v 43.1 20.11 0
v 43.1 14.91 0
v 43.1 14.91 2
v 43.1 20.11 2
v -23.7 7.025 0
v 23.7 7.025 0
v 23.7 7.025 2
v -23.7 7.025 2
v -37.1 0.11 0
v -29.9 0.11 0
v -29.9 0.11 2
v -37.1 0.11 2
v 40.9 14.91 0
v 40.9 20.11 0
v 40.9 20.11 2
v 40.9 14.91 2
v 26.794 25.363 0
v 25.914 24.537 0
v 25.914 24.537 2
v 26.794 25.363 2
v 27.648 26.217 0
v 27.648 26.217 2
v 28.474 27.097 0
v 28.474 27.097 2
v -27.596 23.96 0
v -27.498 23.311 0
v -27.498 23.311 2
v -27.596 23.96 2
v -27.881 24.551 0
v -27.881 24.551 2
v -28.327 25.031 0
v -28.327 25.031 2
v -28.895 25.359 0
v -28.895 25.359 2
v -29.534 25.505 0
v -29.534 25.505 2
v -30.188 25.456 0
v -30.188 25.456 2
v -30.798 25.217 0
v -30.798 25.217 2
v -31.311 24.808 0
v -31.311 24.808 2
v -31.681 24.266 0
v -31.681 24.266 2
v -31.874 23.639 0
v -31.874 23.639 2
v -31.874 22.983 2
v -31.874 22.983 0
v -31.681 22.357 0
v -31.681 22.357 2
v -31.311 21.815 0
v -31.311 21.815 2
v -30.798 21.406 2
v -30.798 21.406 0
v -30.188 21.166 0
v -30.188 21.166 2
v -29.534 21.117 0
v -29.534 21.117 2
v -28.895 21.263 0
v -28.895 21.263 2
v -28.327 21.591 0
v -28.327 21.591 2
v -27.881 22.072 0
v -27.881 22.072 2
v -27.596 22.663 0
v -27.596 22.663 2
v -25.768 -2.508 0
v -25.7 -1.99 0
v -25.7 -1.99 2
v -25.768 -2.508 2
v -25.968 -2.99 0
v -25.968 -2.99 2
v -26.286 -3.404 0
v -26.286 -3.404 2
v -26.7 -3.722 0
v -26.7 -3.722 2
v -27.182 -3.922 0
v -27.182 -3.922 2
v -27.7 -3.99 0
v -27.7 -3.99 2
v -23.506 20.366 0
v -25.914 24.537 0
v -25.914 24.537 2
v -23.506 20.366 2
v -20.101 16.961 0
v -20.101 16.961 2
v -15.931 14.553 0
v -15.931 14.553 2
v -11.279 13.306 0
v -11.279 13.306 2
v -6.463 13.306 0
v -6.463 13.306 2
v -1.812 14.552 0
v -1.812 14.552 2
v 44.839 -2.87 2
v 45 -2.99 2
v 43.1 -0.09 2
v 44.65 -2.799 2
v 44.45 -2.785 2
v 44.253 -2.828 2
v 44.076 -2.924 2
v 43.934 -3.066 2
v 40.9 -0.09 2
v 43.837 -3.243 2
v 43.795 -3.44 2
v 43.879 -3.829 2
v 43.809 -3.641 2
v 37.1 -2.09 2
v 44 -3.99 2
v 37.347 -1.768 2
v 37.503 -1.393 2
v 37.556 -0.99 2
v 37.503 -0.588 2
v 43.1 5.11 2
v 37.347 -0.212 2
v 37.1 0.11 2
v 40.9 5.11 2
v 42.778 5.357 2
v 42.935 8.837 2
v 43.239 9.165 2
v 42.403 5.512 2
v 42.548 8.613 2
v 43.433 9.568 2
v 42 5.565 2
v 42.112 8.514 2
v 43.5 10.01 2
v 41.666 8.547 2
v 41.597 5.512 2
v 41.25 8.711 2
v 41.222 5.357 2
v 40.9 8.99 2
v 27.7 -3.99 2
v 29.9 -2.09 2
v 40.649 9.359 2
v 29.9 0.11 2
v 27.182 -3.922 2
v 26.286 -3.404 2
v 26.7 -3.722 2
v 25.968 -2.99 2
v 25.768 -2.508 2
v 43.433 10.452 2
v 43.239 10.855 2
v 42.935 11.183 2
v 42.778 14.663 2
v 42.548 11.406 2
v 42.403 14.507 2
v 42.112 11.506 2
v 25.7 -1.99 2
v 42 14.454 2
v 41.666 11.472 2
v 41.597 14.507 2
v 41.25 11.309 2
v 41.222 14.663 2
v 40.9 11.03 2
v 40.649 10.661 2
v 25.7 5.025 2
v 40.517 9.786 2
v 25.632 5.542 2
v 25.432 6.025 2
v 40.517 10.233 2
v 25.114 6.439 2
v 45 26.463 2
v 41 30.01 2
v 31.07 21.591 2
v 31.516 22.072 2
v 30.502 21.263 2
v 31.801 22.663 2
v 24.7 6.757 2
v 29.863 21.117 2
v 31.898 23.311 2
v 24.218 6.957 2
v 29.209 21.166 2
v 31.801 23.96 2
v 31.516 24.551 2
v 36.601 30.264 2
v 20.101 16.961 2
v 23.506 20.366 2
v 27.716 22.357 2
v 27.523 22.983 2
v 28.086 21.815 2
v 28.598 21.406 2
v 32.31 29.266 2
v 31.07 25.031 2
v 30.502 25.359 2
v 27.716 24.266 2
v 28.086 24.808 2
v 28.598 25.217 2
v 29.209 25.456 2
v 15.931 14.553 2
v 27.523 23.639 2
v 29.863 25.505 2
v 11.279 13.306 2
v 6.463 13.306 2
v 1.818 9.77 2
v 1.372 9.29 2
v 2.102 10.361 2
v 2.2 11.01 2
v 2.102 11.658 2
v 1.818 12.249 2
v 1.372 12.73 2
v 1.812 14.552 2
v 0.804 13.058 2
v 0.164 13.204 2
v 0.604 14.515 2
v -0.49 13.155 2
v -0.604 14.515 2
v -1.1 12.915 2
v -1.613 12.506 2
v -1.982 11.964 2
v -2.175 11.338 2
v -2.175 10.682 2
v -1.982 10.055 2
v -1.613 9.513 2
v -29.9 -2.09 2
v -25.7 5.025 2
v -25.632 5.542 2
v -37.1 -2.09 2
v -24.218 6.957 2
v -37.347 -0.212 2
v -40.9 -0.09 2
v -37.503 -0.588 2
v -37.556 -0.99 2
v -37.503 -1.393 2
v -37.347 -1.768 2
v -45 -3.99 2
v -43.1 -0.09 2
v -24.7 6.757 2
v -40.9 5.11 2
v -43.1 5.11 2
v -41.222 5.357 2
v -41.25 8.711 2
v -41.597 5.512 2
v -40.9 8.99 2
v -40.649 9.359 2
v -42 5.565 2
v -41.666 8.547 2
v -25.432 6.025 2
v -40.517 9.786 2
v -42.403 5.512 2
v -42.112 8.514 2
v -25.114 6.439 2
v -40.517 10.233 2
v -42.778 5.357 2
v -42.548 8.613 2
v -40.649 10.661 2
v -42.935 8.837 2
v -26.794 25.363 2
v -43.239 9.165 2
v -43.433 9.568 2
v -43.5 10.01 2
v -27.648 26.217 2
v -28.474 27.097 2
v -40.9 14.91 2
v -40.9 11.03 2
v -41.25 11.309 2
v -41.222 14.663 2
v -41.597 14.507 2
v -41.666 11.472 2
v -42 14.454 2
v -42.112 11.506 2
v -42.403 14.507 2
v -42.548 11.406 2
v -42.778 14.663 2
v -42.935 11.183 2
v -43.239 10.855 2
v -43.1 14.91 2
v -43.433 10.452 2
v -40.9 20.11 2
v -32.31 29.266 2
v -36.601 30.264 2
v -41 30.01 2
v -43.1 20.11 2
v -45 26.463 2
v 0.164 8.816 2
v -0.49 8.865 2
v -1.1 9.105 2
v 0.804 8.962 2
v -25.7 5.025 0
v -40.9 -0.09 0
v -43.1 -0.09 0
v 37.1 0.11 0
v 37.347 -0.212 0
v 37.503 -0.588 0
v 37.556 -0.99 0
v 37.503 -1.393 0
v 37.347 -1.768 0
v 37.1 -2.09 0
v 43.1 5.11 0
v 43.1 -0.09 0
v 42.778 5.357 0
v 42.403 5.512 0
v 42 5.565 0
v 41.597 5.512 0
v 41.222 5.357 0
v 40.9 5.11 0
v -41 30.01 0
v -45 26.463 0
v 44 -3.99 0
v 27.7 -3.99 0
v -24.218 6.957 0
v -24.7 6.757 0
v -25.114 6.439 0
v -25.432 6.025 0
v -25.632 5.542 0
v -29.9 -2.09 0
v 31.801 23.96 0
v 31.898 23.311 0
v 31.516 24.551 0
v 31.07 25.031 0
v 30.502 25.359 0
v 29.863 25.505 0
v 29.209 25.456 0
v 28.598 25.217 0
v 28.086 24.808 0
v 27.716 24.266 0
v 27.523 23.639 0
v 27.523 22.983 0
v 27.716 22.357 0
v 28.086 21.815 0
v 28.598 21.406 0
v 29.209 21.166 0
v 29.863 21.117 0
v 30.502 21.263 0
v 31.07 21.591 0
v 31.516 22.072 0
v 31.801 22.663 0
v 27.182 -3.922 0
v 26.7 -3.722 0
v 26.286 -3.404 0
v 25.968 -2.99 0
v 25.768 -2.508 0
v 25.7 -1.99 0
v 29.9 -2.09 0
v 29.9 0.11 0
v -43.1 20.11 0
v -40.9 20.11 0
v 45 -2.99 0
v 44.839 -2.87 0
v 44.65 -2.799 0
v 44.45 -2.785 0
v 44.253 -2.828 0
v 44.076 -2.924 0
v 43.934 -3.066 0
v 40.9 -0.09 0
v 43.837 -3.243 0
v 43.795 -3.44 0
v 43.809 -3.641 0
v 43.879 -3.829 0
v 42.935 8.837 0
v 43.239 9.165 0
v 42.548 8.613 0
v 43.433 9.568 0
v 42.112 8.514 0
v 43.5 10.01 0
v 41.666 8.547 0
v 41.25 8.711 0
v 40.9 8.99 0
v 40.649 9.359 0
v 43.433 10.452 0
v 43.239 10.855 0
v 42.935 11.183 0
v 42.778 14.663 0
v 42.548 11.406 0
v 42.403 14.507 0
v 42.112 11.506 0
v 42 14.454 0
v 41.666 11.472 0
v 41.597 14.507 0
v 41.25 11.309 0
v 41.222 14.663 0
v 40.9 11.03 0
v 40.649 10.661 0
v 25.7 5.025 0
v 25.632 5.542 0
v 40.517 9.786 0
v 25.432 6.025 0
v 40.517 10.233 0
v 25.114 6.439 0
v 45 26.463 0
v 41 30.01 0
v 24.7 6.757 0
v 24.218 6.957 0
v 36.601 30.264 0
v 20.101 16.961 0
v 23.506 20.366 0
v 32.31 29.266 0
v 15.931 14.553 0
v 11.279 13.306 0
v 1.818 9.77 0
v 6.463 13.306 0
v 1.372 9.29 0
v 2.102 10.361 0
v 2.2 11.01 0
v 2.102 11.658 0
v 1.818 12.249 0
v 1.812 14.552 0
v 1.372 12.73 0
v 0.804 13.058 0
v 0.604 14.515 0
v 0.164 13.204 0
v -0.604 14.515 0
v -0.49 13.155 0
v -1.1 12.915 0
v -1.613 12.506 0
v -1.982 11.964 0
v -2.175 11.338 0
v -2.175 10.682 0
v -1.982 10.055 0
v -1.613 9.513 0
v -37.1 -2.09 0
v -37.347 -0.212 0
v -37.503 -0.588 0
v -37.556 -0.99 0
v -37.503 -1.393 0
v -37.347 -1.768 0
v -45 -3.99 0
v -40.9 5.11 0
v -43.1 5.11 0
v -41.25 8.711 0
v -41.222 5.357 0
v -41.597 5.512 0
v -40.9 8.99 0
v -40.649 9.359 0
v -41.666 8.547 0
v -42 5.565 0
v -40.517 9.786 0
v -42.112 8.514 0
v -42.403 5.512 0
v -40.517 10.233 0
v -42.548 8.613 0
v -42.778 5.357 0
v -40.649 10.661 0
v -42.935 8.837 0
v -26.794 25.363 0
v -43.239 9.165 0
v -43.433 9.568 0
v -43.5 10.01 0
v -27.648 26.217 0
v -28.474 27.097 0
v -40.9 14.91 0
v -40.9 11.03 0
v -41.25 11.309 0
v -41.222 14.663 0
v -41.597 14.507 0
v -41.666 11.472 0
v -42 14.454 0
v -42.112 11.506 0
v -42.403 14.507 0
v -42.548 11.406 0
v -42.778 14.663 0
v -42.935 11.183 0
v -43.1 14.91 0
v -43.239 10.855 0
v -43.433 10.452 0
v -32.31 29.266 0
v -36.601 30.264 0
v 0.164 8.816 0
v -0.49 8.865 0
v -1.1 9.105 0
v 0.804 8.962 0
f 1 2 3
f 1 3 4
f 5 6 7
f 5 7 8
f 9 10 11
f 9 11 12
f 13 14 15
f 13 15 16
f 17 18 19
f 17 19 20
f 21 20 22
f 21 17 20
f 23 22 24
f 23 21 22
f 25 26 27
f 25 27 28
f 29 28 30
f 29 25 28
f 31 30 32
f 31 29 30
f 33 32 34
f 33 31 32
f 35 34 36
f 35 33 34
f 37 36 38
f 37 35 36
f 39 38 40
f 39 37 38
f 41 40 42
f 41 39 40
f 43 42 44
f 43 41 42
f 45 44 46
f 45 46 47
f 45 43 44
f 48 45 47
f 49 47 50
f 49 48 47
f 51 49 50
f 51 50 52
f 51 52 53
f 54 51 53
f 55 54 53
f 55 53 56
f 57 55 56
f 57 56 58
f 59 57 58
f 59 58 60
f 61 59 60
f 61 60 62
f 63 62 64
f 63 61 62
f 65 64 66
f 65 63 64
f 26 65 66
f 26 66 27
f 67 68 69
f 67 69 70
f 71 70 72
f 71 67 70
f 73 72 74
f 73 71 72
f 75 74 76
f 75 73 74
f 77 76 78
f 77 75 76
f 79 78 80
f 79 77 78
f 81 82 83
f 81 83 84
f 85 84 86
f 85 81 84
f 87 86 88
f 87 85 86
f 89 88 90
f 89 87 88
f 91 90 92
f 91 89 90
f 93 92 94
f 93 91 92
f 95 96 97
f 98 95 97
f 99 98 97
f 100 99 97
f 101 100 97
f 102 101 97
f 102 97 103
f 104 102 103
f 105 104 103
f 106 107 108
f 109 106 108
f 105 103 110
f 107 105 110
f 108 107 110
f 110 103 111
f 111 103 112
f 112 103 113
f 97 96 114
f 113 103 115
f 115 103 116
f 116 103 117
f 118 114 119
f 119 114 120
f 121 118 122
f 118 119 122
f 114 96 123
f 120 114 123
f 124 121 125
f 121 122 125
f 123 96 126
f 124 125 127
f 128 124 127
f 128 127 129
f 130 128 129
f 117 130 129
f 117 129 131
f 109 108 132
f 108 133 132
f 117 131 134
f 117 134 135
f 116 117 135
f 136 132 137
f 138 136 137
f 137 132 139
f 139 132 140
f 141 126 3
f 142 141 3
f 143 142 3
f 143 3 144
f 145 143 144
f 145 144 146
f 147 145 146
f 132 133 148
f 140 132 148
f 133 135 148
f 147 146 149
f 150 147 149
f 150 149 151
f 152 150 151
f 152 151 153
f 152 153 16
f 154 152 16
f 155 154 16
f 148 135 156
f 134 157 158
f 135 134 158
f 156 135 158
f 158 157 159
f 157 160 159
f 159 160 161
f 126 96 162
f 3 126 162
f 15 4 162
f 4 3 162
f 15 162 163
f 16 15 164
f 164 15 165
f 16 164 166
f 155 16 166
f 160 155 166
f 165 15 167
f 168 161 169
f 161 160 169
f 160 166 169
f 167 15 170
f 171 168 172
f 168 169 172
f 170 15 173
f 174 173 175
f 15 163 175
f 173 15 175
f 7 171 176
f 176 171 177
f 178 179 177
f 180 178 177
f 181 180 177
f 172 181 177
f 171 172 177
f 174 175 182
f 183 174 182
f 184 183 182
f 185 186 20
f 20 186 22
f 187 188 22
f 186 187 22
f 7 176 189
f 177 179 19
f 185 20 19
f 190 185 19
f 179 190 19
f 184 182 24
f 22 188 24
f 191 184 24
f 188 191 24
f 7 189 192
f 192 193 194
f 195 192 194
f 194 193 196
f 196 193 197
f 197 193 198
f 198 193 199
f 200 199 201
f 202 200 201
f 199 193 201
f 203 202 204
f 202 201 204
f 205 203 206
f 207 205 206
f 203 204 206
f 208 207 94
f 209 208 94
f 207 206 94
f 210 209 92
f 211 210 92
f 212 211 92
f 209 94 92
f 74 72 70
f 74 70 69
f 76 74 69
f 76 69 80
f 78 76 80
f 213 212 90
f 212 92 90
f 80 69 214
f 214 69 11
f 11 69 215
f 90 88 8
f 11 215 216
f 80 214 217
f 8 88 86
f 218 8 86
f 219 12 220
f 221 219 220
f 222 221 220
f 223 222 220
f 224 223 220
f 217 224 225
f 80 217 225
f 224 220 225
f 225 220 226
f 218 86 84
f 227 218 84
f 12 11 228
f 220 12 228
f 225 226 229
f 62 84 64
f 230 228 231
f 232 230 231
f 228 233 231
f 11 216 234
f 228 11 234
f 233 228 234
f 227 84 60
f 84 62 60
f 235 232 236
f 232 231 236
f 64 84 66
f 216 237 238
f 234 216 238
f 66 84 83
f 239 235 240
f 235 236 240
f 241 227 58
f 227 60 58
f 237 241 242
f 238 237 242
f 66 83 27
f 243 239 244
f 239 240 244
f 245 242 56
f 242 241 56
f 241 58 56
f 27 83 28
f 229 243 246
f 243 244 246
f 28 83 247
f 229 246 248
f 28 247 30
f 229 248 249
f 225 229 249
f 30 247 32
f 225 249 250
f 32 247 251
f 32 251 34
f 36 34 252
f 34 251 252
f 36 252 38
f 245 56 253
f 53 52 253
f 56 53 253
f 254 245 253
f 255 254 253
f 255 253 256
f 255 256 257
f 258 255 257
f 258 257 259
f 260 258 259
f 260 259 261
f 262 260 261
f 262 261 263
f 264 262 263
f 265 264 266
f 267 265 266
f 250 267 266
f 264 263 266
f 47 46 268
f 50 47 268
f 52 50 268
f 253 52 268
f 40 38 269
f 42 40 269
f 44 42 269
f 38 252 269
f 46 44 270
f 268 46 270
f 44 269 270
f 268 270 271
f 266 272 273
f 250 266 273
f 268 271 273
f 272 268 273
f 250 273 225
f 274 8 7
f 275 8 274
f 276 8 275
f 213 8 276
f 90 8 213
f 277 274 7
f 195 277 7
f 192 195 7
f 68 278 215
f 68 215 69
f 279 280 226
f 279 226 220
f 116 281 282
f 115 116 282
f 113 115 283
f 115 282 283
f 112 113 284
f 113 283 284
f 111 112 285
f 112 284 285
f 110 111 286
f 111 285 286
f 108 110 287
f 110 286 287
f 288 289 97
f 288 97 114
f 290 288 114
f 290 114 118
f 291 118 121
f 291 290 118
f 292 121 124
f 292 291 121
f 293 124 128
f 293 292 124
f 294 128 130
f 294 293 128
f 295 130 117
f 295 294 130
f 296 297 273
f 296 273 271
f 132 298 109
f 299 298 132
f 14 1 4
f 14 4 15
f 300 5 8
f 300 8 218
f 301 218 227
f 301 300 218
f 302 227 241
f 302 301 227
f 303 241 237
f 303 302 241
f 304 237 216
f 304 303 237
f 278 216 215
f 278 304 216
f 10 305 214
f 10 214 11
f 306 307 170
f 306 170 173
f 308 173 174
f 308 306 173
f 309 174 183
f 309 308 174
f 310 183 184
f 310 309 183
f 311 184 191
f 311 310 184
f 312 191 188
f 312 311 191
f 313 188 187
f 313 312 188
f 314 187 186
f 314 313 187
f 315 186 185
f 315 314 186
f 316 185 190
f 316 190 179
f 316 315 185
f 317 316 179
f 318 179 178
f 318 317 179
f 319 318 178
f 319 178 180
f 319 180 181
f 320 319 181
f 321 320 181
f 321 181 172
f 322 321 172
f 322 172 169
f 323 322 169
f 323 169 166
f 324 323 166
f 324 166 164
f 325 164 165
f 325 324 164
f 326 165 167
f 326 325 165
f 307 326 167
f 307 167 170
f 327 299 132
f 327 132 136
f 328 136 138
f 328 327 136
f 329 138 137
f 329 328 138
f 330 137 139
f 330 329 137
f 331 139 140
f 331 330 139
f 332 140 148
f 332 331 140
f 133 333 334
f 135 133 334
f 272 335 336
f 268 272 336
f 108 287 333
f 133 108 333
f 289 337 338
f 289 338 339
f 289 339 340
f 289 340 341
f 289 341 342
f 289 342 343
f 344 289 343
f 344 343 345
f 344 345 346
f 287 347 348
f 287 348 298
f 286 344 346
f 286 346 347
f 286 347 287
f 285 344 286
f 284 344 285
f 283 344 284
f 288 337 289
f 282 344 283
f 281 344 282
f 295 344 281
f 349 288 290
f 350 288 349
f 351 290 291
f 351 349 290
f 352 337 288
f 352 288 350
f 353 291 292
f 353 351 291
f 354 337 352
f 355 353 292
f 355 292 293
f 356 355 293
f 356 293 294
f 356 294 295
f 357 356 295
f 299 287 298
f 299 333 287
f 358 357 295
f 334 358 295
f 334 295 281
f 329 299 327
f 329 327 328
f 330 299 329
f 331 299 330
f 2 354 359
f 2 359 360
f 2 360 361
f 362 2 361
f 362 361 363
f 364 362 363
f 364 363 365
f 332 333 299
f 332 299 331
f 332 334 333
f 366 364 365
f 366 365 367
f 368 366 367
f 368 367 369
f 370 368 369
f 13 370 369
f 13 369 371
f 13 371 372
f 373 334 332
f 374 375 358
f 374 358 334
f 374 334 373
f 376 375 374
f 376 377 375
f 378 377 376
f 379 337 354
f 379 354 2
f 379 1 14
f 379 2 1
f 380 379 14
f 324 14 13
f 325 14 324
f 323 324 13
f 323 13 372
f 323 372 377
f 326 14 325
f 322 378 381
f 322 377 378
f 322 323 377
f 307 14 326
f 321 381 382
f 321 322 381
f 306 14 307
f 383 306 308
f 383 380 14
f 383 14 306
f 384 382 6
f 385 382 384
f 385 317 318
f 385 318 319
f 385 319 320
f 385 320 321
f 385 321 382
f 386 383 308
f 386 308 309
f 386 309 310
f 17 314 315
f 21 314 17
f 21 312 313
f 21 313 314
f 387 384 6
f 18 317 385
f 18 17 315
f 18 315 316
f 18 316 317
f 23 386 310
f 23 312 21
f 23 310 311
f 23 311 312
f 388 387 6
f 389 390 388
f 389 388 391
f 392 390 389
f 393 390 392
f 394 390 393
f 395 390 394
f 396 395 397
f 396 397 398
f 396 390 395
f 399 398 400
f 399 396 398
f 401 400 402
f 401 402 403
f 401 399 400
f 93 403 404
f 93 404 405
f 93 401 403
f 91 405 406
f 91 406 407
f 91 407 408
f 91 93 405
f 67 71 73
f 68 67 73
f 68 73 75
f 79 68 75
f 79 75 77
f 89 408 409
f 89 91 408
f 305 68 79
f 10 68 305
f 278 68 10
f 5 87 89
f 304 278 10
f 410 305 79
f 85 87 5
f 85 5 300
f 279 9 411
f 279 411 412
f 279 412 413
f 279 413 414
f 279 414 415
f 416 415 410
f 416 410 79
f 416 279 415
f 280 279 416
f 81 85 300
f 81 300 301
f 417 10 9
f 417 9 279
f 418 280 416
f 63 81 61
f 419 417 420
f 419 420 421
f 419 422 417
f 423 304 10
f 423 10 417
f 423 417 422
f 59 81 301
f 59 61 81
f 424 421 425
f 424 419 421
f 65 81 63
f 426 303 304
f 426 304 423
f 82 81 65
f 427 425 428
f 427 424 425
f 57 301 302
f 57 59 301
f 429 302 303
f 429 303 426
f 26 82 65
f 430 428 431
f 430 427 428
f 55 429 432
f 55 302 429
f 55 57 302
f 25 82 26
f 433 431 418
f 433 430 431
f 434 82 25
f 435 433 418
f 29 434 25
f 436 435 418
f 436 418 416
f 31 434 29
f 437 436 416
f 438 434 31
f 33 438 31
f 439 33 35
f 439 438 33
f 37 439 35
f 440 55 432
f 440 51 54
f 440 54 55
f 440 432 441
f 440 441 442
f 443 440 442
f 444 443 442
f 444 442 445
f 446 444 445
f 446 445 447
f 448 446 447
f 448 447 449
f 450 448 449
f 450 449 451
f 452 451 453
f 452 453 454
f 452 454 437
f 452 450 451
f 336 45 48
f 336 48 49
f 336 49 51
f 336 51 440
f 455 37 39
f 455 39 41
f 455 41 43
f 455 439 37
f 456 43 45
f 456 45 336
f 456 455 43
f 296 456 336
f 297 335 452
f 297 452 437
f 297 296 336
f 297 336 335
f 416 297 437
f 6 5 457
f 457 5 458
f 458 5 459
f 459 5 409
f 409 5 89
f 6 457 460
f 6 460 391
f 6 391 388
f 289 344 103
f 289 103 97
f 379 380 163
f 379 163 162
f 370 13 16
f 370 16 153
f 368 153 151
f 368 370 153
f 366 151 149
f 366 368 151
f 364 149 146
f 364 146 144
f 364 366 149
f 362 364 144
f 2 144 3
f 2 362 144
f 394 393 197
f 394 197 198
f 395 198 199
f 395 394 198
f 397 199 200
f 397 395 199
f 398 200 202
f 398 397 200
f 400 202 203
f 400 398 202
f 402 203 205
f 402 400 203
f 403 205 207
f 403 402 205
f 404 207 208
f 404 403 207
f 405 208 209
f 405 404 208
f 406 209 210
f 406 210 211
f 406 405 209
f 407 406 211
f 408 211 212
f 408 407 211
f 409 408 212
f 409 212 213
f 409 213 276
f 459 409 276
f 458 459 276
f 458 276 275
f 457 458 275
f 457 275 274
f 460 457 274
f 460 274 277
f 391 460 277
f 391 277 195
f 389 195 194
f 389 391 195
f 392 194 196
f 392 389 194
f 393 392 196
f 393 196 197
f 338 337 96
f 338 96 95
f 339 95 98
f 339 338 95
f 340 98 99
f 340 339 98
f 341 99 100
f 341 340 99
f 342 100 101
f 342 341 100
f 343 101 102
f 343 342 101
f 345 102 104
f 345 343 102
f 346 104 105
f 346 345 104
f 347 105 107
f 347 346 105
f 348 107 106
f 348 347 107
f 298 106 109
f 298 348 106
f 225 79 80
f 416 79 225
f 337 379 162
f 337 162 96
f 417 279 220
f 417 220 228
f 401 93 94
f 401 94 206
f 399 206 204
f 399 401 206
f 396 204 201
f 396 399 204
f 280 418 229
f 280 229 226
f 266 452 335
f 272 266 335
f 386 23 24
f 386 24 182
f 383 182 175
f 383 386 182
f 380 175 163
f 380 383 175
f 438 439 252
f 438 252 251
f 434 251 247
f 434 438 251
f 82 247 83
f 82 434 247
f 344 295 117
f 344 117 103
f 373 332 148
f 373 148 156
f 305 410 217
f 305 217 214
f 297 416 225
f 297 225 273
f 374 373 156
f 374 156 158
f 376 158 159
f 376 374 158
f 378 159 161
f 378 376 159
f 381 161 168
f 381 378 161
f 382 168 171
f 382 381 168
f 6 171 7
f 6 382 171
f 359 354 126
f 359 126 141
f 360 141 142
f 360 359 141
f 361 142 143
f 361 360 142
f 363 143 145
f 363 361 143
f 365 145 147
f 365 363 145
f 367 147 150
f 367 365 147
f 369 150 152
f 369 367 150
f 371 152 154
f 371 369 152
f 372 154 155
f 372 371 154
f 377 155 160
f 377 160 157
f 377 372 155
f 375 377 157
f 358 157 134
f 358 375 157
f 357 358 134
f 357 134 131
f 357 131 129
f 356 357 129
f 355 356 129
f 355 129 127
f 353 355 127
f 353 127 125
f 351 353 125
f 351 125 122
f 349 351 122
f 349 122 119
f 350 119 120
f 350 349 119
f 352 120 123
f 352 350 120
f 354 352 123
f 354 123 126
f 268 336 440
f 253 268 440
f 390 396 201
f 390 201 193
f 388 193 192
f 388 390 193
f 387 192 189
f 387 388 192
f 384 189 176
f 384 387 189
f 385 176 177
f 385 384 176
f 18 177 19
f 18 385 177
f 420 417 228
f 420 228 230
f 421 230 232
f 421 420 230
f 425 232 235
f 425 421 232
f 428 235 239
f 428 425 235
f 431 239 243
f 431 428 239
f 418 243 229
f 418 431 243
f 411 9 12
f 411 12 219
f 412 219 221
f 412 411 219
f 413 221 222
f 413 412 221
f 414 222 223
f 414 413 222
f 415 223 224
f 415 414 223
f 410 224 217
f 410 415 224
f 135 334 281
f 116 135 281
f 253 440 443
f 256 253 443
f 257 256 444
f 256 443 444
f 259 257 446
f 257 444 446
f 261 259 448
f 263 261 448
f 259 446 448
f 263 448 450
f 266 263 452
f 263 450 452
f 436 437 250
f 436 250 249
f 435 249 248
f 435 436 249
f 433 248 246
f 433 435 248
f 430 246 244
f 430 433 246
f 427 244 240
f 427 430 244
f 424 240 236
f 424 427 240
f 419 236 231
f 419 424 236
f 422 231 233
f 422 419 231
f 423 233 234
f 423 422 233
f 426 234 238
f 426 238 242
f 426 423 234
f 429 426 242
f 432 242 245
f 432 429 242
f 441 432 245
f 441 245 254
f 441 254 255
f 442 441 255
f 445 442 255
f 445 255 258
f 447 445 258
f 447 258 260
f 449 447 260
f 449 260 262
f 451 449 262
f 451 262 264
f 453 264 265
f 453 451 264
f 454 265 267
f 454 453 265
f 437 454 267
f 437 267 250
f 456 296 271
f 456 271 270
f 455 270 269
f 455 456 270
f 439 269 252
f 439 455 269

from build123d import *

# Parameters (mm, degrees)
SKETCH_3_R      = 1.5
SKETCH_3_R_2    = 2.2
EXTRUDE_1_DEPTH = 2


with BuildPart() as part:
    # 草图3 → 凸台-拉伸1 (new body)
    with BuildSketch(Plane.XY):
        with BuildLine():
            Line((-41, -3.990216685), (-42, -3.990216685))
            Line((-42, -3.990216685), (-44, -3.990216685))
            Line((-44, -3.990216685), (-45, -3.990216685))
            Line((-45, -3.990216685), (-45, 5.009783315))
            Line((-45, 5.009783315), (-45, 15.009783315))
            Line((-45, 15.009783315), (-45, 26.463053661))
            Line((-45, 26.463053661), (-41, 30.009783315))
            ThreePointArc((-41, 30.009783315), (-34.419700864, 29.918417158), (-28.474223712, 27.097072458))
            ThreePointArc((-28.474223712, 27.097072458), (-27.224142461, 25.786703646), (-25.913822442, 24.53657125))
            ThreePointArc((-25.913822442, 24.53657125), (-15.930575492, 14.552804361), (-1.811764606, 14.552436817))
            ThreePointArc((-1.811764606, 14.552436817), (0, 14.509783437), (1.811764606, 14.552436817))
            ThreePointArc((1.811764606, 14.552436817), (15.930575492, 14.552804361), (25.913822442, 24.53657125))
            ThreePointArc((25.913822442, 24.53657125), (27.224142461, 25.786703646), (28.474223712, 27.097072458))
            ThreePointArc((28.474223712, 27.097072458), (34.419700864, 29.918417158), (41, 30.009783315))
            Line((41, 30.009783315), (45, 26.463053661))
            Line((45, 26.463053661), (45, 15.009783315))
            Line((45, 15.009783315), (45, 5.009783315))
            Line((45, 5.009783315), (45, -2.990216685))
            ThreePointArc((45, -2.990216685), (44, -2.990216685), (44, -3.990216685))
            Line((44, -3.990216685), (41, -3.990216685))
            Line((41, -3.990216685), (27.7, -3.990216685))
            ThreePointArc((27.7, -3.990216685), (26.285786438, -3.404430248), (25.7, -1.990216685))
            Line((25.7, -1.990216685), (25.7, 5.024732502))
            ThreePointArc((25.7, 5.024732502), (25.114213562, 6.438946065), (23.7, 7.024732502))
            Line((23.7, 7.024732502), (-23.7, 7.024732502))
            ThreePointArc((-23.7, 7.024732502), (-25.114213562, 6.438946065), (-25.7, 5.024732502))
            Line((-25.7, 5.024732502), (-25.7, -1.990216685))
            ThreePointArc((-25.7, -1.990216685), (-26.285786438, -3.404430248), (-27.7, -3.990216685))
            Line((-27.7, -3.990216685), (-41, -3.990216685))
        make_face()
        with Locations((42, 10.009783315)):
            Circle(SKETCH_3_R, mode=Mode.SUBTRACT)
        with Locations(Location((-42, 10.009783315, 0), (0, 0, 180))):
            Circle(SKETCH_3_R, mode=Mode.SUBTRACT)
        with Locations((0, 11.009783312)):
            Circle(SKETCH_3_R_2, mode=Mode.SUBTRACT)
        with Locations((-29.69848481, 23.311298502)):
            Circle(SKETCH_3_R_2, mode=Mode.SUBTRACT)
        with Locations((29.69848481, 23.311298502)):
            Circle(SKETCH_3_R_2, mode=Mode.SUBTRACT)
        with BuildLine():
            Line((-37.1, -2.090216685), (-29.9, -2.090216685))
            Line((-29.9, -2.090216685), (-29.9, 0.109783315))
            Line((-29.9, 0.109783315), (-37.1, 0.109783315))
            ThreePointArc((-37.1, 0.109783315), (-37.555634919, -0.990216685), (-37.1, -2.090216685))
        make_face(mode=Mode.SUBTRACT)
        with BuildLine():
            Line((29.9, -2.090216685), (29.9, 0.109783315))
            Line((29.9, 0.109783315), (37.1, 0.109783315))
            ThreePointArc((37.1, 0.109783315), (37.555634919, -0.990216685), (37.1, -2.090216685))
            Line((37.1, -2.090216685), (29.9, -2.090216685))
        make_face(mode=Mode.SUBTRACT)
        with BuildLine():
            Line((-43.1, 5.109783315), (-43.1, -0.090216685))
            Line((-43.1, -0.090216685), (-40.9, -0.090216685))
            Line((-40.9, -0.090216685), (-40.9, 5.109783315))
            ThreePointArc((-40.9, 5.109783315), (-42, 5.565418233), (-43.1, 5.109783315))
        make_face(mode=Mode.SUBTRACT)
        with BuildLine():
            Line((-43.1, 20.109783315), (-40.9, 20.109783315))
            Line((-40.9, 20.109783315), (-40.9, 14.909783315))
            ThreePointArc((-40.9, 14.909783315), (-42, 14.454148396), (-43.1, 14.909783315))
            Line((-43.1, 14.909783315), (-43.1, 20.109783315))
        make_face(mode=Mode.SUBTRACT)
        with BuildLine():
            Line((40.9, 20.109783315), (40.9, 14.909783315))
            ThreePointArc((40.9, 14.909783315), (42, 14.454148396), (43.1, 14.909783315))
            Line((43.1, 14.909783315), (43.1, 20.109783315))
            Line((43.1, 20.109783315), (40.9, 20.109783315))
        make_face(mode=Mode.SUBTRACT)
        with BuildLine():
            Line((40.9, 5.109783315), (40.9, -0.090216685))
            Line((40.9, -0.090216685), (43.1, -0.090216685))
            Line((43.1, -0.090216685), (43.1, 5.109783315))
            ThreePointArc((43.1, 5.109783315), (42, 5.565418233), (40.9, 5.109783315))
        make_face(mode=Mode.SUBTRACT)
    extrude(amount=EXTRUDE_1_DEPTH)


solid = part.part
